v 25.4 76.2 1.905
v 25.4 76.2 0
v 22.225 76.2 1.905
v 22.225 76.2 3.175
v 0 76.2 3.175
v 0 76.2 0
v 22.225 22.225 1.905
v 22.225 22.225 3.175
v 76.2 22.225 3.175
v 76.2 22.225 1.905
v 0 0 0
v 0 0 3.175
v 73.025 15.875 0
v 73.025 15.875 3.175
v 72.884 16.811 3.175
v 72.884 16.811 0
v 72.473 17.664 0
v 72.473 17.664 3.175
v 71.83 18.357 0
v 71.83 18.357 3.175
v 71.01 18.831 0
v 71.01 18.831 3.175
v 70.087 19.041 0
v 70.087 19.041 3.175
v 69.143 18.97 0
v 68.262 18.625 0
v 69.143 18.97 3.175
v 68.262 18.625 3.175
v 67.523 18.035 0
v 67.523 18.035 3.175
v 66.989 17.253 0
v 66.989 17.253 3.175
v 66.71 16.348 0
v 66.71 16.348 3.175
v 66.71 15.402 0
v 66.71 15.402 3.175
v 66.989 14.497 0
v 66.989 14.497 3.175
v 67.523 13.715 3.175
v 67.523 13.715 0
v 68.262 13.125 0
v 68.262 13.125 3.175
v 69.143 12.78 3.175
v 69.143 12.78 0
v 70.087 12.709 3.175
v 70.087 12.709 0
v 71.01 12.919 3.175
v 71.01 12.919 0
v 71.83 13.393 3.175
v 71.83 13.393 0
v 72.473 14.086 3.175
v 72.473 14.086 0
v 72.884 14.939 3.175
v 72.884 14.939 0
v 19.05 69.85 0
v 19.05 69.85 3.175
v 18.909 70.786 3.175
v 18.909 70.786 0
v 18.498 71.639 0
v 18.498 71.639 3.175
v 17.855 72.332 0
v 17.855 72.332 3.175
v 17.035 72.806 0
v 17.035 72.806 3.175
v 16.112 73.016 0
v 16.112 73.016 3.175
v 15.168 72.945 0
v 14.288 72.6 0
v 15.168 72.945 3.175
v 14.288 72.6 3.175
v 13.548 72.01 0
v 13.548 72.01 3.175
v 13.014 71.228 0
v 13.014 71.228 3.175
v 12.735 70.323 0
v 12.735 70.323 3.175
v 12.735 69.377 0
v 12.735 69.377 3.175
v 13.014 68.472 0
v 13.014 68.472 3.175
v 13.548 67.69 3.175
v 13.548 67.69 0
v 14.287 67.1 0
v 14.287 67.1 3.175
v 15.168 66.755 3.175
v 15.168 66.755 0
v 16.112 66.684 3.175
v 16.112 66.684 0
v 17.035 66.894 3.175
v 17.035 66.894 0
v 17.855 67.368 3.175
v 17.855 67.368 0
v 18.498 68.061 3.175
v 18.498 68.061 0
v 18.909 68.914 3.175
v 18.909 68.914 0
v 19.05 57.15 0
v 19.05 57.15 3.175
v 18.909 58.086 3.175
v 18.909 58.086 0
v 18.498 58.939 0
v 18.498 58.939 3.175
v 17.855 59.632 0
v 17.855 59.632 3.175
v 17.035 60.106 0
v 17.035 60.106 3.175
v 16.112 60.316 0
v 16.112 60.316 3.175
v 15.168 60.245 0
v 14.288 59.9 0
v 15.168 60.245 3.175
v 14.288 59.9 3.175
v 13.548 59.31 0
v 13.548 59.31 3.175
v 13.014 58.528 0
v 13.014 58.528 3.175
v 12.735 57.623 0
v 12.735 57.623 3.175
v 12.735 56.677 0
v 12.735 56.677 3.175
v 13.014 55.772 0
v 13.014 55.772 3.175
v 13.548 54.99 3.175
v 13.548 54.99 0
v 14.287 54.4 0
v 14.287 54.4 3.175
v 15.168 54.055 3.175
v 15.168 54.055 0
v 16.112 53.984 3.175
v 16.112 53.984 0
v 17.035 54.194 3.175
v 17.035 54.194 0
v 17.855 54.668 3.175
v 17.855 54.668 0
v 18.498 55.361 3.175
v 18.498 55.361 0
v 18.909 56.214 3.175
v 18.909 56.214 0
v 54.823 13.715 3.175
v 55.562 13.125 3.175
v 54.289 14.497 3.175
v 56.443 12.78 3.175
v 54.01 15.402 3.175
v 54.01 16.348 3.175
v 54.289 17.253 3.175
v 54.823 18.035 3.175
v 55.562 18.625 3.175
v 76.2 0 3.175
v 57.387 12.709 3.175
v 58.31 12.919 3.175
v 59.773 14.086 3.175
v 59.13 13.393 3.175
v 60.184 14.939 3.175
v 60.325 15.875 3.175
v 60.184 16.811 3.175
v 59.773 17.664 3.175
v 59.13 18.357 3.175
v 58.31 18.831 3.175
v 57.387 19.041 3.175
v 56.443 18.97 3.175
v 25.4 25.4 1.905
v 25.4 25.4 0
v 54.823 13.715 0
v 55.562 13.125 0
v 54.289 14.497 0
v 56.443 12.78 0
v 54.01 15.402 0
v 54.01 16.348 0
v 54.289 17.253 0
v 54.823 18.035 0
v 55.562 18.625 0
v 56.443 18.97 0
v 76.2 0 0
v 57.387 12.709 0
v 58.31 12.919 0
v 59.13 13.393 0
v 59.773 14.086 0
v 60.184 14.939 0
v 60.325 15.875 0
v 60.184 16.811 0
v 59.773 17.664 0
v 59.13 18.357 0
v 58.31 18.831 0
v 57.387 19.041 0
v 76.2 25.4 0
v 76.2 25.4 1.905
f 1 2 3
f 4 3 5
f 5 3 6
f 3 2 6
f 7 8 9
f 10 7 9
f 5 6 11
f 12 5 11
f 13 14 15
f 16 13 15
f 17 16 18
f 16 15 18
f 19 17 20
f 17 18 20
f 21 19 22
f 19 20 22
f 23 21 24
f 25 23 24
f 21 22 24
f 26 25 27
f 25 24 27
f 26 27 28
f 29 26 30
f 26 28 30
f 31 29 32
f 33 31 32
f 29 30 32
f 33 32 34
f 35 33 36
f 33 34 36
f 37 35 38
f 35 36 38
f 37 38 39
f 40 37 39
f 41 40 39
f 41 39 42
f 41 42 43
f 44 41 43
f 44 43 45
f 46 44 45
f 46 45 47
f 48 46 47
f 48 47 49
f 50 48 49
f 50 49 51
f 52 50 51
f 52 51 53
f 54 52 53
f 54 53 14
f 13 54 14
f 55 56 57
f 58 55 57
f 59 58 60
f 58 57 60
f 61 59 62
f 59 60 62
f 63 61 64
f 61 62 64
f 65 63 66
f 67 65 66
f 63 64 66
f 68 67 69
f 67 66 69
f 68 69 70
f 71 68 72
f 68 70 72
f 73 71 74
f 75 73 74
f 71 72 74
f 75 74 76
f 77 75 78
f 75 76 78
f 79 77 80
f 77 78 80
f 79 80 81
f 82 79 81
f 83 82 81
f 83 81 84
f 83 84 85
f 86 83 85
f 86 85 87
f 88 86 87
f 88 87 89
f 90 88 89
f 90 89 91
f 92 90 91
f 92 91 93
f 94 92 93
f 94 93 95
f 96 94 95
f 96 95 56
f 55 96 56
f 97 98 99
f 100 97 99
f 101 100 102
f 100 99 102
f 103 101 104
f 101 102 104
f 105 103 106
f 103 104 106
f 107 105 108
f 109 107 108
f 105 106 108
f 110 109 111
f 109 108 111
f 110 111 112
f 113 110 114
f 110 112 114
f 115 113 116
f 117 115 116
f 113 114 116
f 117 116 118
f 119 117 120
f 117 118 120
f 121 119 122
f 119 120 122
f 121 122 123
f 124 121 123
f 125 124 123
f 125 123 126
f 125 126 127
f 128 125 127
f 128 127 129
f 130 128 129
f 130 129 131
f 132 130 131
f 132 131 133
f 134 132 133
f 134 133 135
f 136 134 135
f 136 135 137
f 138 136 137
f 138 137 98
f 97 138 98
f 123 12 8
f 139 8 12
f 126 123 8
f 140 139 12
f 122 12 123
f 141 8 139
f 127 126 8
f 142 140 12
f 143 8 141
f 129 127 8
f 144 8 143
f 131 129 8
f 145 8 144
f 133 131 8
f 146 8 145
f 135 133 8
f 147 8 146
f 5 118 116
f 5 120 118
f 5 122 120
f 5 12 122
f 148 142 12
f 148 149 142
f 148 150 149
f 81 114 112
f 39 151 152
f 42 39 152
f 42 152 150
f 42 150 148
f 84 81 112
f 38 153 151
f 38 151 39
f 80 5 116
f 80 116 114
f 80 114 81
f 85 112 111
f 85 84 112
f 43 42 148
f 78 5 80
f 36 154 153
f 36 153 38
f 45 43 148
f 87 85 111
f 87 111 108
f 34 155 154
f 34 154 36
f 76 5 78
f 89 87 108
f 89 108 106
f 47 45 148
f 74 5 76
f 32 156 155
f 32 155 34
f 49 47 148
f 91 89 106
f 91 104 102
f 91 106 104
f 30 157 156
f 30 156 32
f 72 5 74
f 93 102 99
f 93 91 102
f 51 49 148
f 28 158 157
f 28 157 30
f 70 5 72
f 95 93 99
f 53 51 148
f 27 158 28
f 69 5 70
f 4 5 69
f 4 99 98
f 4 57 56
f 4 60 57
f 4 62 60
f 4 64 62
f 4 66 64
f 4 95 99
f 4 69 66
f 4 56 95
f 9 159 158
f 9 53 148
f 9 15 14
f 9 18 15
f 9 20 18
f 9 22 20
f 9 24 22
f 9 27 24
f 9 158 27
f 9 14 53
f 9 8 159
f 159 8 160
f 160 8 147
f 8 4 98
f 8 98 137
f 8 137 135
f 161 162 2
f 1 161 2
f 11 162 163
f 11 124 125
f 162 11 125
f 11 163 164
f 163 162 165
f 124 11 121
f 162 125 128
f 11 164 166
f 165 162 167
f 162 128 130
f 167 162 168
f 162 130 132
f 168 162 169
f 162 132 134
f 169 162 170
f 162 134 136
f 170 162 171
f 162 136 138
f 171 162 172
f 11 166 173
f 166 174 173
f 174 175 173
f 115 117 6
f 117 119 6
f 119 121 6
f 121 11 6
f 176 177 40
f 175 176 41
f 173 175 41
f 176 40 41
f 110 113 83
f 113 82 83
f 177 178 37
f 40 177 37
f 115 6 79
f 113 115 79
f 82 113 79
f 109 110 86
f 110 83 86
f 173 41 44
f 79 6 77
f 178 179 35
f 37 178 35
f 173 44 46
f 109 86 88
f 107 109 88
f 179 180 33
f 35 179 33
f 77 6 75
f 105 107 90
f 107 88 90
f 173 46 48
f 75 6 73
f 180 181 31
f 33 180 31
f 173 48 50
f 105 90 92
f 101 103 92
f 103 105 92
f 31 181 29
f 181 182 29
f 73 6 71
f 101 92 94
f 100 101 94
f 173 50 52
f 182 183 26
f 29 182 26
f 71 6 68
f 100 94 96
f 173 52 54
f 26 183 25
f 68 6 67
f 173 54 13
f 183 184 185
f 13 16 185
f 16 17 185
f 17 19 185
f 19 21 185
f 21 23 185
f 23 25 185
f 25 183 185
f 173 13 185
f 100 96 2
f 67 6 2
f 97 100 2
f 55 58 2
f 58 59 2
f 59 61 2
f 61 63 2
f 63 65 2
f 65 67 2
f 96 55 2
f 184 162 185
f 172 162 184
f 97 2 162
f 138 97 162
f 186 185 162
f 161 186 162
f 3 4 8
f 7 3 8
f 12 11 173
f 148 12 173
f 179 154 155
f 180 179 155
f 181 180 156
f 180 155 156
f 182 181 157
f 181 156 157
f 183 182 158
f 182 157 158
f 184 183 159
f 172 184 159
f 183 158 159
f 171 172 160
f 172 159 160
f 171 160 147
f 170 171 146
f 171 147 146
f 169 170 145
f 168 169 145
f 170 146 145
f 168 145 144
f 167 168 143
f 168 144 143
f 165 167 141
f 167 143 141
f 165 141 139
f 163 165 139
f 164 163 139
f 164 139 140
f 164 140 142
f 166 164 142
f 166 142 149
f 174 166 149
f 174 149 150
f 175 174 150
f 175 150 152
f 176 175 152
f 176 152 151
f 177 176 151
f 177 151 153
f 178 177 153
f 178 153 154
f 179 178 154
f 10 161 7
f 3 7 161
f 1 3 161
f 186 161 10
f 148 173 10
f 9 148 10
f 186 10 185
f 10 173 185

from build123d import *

# Parameters (mm, degrees)
F1_DEPTH = 3.175
F3_DEPTH = 1.27
F4_R     = 3.175
F5_DEPTH = 25.4


with BuildPart() as f1:
    # F0 (on Top) → F1 (new body)
    with BuildSketch(Plane.XY):
        Polygon((0, 76.2), (0, 0), (76.2, 0), (76.2, 25.4), (25.4, 25.4), (25.4, 76.2), align=None)
    extrude(amount=F1_DEPTH)

    # F2 (on face) → F3 (cut)
    with BuildSketch(Plane.XY.offset(3.175)):
        Polygon((25.4, 25.4), (25.4, 76.2), (22.225, 76.2), (22.225, 25.4), (22.225, 22.225), (25.4, 22.225), (76.2, 22.225), (76.2, 25.4), align=None)
    extrude(amount=-F3_DEPTH, mode=Mode.SUBTRACT)

    # F4 (on face) → F5 (cut)
    with BuildSketch(Plane.XY.offset(3.175)):
        with Locations((69.85, 15.875)):
            Circle(F4_R)
        with Locations((57.15, 15.875)):
            Circle(F4_R)
        with Locations((15.875, 69.85)):
            Circle(F4_R)
        with Locations((15.875, 57.15)):
            Circle(F4_R)
    extrude(amount=-F5_DEPTH, mode=Mode.SUBTRACT)


solid = f1.part
